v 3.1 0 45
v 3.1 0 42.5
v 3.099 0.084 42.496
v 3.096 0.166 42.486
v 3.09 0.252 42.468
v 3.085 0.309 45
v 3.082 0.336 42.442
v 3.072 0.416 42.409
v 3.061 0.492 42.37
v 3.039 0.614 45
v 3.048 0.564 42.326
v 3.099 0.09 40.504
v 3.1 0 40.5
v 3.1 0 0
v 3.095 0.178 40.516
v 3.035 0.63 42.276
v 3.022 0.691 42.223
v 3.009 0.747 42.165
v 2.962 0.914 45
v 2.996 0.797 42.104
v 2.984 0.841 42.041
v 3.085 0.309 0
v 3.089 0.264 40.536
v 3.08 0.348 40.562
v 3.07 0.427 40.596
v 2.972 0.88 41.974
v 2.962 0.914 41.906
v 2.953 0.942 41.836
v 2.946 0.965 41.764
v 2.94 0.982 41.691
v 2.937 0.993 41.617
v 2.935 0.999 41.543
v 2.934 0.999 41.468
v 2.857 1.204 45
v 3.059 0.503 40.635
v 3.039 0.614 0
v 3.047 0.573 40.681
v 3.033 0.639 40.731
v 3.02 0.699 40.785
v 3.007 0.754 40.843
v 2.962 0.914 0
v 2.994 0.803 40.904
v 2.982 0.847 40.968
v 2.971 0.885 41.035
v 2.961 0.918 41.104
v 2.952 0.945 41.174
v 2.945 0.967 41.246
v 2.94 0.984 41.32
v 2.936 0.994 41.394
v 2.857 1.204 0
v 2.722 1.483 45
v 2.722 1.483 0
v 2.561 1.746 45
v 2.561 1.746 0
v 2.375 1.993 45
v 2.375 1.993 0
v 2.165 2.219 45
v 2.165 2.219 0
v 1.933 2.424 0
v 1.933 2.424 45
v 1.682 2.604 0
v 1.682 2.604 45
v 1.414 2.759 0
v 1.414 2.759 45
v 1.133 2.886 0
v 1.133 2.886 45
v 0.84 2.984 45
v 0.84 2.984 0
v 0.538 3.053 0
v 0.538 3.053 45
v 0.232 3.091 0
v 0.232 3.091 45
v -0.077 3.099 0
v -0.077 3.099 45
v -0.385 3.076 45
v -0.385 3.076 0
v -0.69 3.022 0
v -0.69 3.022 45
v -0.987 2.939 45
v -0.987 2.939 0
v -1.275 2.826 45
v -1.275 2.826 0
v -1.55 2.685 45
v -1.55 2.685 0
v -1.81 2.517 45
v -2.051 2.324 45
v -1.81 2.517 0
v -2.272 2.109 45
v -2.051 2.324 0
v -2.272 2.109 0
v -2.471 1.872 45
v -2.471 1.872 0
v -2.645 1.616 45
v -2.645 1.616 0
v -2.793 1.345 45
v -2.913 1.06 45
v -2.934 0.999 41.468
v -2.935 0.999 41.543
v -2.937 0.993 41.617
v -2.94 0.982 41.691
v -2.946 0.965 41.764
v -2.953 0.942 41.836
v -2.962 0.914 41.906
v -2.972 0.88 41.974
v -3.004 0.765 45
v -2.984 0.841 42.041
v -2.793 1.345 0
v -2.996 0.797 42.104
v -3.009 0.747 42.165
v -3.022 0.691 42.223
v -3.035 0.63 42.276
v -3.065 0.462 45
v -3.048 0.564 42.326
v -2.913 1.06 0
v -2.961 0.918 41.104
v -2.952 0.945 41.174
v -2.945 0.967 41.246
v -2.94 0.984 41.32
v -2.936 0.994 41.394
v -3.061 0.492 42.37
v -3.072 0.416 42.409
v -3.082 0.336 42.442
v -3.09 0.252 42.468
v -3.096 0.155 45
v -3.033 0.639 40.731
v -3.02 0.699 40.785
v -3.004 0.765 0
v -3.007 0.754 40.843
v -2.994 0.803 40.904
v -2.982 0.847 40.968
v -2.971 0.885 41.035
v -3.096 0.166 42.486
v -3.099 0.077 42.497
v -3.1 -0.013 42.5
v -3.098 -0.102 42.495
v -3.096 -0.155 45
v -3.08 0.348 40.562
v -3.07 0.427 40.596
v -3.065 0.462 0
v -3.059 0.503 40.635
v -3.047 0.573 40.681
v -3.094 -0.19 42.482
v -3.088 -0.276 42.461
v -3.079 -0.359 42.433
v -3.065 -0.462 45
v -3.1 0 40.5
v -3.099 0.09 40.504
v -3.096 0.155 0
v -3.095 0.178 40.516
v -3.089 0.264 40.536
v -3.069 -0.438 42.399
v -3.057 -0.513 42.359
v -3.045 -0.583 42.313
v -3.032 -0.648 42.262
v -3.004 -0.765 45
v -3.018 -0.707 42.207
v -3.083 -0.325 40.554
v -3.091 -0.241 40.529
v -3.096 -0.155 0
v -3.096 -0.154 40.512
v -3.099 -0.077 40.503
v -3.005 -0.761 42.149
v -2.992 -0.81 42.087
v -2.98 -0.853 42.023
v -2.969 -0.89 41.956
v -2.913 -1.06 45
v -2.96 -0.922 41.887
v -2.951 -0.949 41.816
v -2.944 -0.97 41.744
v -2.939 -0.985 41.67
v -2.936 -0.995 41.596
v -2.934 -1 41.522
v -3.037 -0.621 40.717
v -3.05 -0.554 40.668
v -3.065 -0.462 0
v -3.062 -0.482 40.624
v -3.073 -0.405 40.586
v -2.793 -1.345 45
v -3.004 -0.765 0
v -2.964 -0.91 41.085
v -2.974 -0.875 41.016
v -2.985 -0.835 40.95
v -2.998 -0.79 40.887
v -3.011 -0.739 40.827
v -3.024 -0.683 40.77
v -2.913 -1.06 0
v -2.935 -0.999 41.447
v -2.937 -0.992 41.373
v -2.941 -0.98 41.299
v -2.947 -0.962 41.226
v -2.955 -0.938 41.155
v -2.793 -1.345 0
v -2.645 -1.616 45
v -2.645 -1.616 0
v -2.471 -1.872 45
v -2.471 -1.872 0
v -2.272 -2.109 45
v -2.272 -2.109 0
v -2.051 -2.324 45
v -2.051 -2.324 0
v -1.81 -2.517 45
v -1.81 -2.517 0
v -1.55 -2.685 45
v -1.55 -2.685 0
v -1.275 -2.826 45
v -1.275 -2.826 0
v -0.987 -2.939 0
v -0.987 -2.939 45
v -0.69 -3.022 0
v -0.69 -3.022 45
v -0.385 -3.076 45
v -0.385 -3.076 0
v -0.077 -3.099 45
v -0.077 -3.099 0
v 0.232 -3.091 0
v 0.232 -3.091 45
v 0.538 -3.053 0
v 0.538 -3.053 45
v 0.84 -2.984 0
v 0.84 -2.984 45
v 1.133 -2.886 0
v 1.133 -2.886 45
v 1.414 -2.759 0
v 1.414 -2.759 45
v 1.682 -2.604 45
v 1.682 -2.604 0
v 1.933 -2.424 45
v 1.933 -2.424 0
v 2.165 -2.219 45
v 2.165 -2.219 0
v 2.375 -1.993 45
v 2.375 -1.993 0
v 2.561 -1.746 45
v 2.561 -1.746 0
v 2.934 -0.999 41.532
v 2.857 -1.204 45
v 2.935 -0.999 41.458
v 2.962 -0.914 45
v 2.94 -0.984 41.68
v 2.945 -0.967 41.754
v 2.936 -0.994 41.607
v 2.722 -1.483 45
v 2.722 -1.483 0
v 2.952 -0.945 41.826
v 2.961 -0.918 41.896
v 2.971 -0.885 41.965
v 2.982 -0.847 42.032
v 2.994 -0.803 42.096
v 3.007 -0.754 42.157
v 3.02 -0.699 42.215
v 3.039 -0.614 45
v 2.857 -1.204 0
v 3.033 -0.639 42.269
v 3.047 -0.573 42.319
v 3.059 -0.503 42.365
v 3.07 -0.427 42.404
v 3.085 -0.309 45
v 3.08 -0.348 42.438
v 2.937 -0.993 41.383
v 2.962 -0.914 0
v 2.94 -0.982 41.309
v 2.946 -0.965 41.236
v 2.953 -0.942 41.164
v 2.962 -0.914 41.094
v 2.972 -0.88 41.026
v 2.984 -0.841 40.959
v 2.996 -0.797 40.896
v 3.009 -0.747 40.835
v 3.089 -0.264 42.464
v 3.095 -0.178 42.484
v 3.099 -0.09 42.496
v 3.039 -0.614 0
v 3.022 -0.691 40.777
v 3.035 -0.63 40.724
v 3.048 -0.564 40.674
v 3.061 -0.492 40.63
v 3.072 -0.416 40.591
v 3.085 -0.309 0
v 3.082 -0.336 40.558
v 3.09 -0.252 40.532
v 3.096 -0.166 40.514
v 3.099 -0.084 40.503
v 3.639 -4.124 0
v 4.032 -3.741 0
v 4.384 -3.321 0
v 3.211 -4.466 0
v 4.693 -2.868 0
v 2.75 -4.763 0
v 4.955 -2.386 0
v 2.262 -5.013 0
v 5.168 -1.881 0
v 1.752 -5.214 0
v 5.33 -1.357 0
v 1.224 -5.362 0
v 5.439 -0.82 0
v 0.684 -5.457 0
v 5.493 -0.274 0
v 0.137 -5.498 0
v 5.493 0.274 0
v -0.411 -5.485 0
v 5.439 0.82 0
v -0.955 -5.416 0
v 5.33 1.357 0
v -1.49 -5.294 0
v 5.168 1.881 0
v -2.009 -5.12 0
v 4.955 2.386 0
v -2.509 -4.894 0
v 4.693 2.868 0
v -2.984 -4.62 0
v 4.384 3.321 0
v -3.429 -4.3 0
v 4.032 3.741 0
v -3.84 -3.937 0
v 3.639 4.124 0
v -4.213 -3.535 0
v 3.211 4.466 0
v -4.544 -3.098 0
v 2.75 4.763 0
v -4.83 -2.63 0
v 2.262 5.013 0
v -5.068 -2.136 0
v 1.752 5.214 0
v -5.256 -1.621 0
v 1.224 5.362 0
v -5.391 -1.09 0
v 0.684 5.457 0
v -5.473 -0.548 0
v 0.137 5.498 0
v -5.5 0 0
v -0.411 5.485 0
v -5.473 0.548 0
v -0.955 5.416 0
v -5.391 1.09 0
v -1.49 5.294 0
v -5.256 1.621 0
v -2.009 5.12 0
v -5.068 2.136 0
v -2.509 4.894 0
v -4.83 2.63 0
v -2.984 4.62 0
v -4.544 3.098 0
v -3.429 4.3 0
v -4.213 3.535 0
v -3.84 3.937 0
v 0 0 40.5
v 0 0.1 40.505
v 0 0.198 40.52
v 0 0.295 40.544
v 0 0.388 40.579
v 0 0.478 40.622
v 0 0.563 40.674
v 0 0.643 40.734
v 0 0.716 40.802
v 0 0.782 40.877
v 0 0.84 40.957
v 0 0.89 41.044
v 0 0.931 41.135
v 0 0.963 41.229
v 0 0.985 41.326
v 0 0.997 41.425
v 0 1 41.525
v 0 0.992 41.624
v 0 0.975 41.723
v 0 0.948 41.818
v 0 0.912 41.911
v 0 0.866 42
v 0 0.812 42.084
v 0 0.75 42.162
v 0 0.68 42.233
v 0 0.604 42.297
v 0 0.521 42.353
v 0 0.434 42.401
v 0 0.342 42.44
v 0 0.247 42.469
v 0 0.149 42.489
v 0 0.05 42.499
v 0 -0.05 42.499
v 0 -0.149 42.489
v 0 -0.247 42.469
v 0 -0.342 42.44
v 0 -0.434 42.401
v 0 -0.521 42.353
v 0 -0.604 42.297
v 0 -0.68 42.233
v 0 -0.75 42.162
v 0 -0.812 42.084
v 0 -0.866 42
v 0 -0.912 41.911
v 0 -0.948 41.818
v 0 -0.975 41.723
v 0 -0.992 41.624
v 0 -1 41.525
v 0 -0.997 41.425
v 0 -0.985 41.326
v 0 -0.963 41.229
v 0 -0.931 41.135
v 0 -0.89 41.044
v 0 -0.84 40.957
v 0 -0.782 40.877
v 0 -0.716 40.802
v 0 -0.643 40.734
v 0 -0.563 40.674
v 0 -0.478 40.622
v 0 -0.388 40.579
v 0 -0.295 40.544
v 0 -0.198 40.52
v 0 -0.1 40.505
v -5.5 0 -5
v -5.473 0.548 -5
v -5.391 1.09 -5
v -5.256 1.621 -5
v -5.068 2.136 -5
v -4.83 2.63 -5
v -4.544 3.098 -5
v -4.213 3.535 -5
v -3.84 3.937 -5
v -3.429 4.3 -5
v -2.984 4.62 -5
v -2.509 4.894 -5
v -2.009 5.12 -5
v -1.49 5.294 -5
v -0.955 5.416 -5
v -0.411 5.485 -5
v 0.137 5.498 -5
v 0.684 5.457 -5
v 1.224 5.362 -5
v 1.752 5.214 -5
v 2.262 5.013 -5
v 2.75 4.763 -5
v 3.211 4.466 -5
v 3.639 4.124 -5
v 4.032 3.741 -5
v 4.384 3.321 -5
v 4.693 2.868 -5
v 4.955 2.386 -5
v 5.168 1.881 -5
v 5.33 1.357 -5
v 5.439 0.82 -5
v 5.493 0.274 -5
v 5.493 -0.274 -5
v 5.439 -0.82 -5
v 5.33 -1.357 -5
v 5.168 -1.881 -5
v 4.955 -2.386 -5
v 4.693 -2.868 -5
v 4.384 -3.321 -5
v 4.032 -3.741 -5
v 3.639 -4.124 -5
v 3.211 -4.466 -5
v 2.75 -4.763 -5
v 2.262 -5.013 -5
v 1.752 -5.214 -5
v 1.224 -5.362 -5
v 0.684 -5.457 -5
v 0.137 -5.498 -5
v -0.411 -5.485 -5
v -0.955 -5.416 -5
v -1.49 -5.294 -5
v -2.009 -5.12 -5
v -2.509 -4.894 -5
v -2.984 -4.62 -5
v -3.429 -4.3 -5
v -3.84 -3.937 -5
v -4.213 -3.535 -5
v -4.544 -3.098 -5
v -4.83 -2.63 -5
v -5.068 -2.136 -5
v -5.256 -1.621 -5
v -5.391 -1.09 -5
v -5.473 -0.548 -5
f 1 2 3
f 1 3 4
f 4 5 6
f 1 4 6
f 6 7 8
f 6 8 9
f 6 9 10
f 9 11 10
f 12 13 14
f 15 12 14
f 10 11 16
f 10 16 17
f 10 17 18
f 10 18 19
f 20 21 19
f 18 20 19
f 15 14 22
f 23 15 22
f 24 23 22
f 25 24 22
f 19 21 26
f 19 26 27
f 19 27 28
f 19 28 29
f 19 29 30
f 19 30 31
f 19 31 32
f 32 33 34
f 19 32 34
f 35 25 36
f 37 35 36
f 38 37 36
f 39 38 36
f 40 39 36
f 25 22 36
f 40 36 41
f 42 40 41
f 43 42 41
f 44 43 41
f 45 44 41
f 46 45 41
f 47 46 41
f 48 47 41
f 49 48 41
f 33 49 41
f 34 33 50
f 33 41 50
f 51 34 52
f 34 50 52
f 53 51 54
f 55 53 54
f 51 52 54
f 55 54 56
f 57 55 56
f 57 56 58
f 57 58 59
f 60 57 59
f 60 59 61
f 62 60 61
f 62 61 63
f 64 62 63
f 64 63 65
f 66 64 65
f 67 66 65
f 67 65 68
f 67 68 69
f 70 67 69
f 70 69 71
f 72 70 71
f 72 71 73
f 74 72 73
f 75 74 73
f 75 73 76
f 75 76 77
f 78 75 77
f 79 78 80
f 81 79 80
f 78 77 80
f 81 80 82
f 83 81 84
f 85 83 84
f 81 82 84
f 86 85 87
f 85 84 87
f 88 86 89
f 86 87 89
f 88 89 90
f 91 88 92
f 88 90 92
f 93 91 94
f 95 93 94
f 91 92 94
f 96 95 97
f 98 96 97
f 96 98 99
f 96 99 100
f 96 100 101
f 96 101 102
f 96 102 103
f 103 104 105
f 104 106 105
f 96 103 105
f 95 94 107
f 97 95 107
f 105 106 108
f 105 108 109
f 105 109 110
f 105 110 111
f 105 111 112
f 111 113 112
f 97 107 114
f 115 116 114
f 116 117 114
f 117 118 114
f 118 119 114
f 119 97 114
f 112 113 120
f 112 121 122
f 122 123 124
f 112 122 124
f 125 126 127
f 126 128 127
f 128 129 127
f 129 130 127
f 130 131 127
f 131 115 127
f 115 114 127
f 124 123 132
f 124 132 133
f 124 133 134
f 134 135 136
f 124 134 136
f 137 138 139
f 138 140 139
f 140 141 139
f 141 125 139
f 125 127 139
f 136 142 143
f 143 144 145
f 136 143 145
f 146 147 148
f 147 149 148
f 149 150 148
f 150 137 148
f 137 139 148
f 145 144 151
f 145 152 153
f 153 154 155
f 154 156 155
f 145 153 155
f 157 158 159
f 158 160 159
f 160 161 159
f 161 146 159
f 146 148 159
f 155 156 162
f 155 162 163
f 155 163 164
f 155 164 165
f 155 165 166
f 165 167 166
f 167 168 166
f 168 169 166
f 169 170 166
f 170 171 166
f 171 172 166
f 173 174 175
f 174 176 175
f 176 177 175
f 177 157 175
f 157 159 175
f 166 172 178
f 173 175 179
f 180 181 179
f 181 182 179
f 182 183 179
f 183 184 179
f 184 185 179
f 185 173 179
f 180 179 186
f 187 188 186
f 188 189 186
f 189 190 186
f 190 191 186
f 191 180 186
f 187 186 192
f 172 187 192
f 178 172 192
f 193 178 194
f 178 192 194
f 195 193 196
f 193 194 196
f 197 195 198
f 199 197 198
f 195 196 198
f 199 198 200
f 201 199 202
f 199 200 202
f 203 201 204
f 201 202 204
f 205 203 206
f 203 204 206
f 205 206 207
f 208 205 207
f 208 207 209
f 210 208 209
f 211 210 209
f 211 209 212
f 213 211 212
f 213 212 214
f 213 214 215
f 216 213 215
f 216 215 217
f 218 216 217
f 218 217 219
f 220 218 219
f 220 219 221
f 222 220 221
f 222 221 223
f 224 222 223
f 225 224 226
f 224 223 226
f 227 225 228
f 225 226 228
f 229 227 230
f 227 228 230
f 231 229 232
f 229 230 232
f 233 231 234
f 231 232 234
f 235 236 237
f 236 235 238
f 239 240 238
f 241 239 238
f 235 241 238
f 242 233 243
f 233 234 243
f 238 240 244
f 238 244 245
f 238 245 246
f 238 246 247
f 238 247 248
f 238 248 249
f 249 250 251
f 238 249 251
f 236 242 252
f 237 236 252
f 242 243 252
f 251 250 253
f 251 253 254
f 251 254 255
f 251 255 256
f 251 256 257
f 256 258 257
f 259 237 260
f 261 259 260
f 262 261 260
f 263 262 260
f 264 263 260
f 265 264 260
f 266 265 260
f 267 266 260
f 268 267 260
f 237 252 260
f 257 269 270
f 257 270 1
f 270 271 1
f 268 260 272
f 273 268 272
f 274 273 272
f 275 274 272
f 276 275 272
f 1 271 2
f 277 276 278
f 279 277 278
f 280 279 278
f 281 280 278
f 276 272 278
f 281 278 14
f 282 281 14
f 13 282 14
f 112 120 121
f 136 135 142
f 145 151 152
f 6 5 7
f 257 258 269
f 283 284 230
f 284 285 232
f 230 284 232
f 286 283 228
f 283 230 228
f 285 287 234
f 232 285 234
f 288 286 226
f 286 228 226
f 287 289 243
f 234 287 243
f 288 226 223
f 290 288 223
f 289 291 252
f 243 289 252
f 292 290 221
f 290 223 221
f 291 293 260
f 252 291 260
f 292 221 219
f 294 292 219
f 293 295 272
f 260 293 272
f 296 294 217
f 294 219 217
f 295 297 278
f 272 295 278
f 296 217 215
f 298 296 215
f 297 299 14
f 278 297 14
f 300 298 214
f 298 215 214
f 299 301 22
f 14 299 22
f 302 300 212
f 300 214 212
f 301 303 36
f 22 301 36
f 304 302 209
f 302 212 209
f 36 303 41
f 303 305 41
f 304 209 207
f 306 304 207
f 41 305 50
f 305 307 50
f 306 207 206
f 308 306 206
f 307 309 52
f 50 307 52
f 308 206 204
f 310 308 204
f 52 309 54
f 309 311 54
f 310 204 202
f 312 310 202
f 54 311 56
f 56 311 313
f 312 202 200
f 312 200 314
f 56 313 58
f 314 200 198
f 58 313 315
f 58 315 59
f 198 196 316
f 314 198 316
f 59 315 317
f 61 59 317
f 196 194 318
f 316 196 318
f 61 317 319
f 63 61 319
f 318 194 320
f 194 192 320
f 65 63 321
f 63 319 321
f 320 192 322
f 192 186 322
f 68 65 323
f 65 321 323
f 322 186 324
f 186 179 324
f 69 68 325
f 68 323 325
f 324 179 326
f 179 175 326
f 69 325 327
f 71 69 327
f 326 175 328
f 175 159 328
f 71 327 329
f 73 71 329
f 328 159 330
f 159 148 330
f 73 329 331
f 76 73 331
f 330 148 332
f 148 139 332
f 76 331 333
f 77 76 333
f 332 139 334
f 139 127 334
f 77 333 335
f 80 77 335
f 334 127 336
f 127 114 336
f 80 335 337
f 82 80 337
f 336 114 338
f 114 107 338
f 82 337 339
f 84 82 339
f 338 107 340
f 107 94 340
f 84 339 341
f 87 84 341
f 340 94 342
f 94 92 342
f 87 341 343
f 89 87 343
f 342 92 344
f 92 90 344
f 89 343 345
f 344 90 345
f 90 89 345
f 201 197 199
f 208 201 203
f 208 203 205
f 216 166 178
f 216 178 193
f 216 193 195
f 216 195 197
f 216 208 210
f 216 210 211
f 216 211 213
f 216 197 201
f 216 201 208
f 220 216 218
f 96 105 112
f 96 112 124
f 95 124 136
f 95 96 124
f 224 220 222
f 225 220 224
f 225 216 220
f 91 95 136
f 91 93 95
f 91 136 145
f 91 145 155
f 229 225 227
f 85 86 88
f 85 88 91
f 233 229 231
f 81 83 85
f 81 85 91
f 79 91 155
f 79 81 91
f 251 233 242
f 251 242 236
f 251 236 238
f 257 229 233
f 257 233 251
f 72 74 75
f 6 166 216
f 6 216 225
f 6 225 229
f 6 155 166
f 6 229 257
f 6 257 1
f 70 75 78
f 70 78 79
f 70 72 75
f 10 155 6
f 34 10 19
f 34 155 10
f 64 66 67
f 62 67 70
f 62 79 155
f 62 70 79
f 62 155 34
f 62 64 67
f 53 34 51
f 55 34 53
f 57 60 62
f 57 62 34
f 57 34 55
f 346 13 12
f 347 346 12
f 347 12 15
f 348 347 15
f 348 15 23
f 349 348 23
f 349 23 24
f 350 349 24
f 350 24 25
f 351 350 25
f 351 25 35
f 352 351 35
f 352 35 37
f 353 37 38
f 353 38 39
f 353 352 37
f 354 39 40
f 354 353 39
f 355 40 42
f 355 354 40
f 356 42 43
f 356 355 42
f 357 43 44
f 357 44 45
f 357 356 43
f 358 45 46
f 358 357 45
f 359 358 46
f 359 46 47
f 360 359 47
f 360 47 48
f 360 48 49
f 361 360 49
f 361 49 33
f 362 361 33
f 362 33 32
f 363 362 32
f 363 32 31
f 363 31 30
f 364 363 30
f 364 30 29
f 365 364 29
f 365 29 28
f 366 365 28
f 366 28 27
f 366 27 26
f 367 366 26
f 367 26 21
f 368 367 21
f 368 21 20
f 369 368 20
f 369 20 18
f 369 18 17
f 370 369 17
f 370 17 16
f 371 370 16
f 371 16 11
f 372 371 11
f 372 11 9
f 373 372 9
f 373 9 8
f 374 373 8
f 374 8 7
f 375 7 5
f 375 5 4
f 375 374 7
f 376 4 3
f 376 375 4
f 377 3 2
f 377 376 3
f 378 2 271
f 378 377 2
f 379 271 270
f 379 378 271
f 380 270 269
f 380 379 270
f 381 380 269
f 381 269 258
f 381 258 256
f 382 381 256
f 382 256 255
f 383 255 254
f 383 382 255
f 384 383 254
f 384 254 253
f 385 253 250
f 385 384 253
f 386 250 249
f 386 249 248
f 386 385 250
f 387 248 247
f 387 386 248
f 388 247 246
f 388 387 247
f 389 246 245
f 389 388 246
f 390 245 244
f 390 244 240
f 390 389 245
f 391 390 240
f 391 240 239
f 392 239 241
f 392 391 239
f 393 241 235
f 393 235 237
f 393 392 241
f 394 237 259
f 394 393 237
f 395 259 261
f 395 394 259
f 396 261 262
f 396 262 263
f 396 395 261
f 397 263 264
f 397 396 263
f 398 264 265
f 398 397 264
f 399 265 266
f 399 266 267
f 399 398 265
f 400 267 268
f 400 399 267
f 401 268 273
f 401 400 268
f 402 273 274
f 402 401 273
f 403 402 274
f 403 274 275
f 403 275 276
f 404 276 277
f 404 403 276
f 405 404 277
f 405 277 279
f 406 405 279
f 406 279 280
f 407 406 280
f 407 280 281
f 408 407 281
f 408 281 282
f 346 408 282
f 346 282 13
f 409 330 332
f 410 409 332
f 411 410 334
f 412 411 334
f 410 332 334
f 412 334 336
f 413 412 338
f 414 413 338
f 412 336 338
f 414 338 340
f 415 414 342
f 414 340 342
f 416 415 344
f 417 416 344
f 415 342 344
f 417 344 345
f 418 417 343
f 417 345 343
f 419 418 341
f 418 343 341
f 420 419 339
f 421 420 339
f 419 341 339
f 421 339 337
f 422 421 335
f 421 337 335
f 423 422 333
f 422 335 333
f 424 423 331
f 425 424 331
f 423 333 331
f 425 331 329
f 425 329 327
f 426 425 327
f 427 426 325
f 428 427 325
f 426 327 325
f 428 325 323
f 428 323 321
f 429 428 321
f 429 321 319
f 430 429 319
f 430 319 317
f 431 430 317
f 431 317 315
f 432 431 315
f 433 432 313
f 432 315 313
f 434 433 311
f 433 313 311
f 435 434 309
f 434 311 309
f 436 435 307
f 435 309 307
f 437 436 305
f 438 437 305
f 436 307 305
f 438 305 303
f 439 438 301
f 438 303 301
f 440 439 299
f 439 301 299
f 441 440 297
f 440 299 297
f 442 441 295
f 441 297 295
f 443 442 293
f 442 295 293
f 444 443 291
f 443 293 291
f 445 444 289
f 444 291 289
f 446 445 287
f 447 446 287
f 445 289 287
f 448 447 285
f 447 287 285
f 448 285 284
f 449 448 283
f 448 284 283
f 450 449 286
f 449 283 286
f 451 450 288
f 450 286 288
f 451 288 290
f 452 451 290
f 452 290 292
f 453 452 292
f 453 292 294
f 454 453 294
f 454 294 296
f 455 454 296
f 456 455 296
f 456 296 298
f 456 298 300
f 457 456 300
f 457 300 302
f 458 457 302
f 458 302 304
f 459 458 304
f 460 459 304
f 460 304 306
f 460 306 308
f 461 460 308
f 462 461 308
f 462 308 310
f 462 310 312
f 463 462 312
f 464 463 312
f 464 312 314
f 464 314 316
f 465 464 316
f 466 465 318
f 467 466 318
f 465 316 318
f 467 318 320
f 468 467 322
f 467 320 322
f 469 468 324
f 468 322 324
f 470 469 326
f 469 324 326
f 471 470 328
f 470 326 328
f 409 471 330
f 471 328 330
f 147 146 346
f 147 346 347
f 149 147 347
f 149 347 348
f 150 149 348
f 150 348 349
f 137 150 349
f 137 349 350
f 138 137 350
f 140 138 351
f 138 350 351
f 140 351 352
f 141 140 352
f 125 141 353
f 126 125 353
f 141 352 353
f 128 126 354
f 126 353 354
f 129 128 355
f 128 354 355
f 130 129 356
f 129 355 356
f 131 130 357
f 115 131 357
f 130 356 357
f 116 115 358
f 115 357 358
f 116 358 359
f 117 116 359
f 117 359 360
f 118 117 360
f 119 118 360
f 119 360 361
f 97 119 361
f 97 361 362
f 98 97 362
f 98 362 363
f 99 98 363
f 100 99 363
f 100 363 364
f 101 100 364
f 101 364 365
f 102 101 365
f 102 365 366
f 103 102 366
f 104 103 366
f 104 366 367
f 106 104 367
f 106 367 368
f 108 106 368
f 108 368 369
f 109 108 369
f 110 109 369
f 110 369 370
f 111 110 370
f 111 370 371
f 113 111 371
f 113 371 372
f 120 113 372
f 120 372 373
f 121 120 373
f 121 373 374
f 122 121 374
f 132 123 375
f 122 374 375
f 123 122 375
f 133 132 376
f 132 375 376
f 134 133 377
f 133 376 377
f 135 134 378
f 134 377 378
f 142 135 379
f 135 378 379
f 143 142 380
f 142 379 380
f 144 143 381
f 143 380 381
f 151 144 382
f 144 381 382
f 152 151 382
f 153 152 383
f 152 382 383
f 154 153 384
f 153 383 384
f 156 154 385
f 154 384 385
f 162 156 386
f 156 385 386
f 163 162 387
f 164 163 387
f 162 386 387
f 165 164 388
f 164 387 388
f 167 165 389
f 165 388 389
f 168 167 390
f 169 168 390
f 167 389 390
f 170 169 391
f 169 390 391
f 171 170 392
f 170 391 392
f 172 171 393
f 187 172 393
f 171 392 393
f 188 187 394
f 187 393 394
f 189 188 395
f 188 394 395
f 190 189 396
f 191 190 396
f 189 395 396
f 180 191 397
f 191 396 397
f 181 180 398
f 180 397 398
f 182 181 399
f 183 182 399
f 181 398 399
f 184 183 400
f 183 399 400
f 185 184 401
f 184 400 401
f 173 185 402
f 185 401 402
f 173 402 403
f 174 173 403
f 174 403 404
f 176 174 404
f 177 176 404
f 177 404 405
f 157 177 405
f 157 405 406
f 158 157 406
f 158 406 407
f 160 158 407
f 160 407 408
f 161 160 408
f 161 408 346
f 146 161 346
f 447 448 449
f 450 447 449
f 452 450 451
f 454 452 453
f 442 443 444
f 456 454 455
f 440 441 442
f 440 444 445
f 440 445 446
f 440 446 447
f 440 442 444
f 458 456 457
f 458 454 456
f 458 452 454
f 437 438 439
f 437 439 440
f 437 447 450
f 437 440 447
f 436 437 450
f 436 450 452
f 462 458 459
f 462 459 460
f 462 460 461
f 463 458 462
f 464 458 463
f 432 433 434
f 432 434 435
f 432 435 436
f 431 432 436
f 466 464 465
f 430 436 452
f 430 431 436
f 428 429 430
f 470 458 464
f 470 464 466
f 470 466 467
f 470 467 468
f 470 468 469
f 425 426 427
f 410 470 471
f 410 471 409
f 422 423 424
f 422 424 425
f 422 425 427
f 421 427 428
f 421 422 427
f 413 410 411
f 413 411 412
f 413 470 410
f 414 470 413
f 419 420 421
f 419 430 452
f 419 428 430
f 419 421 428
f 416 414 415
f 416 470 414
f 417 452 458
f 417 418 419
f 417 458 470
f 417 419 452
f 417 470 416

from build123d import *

# Parameters (mm, degrees)
SKETCH1_R               = 3.1
BOSS_EXTRUDE1_DEPTH     = 45
SKETCH2_R               = 1
CUT_EXTRUDE1_DEPTH      = 4.1
CUT_EXTRUDE1_DEPTH_BACK = 4.1
SKETCH3_R               = 5.5
BOSS_EXTRUDE2_DEPTH     = 5


with BuildPart() as part:
    # Sketch1 → Boss-Extrude1 (new body)
    with BuildSketch(Plane.XY):
        Circle(SKETCH1_R)
    extrude(amount=BOSS_EXTRUDE1_DEPTH)

    # Sketch2 → Cut-Extrude1 (cut, two sides)
    with BuildSketch(Plane(origin=(0, 0, 0), x_dir=(0, 0, -1), z_dir=(1, 0, 0))) as cut_extrude1_sk:
        with Locations((-41.5, 0)):
            Circle(SKETCH2_R)
    extrude(amount=CUT_EXTRUDE1_DEPTH, mode=Mode.SUBTRACT)
    extrude(cut_extrude1_sk.sketch, amount=-CUT_EXTRUDE1_DEPTH_BACK, mode=Mode.SUBTRACT)

    # Sketch3 → Boss-Extrude2 (add)
    with BuildSketch(Plane(origin=(0, 0, 0), x_dir=(-1, 0, 0), z_dir=(0, 0, -1))):
        Circle(SKETCH3_R)
    extrude(amount=BOSS_EXTRUDE2_DEPTH)


solid = part.part
